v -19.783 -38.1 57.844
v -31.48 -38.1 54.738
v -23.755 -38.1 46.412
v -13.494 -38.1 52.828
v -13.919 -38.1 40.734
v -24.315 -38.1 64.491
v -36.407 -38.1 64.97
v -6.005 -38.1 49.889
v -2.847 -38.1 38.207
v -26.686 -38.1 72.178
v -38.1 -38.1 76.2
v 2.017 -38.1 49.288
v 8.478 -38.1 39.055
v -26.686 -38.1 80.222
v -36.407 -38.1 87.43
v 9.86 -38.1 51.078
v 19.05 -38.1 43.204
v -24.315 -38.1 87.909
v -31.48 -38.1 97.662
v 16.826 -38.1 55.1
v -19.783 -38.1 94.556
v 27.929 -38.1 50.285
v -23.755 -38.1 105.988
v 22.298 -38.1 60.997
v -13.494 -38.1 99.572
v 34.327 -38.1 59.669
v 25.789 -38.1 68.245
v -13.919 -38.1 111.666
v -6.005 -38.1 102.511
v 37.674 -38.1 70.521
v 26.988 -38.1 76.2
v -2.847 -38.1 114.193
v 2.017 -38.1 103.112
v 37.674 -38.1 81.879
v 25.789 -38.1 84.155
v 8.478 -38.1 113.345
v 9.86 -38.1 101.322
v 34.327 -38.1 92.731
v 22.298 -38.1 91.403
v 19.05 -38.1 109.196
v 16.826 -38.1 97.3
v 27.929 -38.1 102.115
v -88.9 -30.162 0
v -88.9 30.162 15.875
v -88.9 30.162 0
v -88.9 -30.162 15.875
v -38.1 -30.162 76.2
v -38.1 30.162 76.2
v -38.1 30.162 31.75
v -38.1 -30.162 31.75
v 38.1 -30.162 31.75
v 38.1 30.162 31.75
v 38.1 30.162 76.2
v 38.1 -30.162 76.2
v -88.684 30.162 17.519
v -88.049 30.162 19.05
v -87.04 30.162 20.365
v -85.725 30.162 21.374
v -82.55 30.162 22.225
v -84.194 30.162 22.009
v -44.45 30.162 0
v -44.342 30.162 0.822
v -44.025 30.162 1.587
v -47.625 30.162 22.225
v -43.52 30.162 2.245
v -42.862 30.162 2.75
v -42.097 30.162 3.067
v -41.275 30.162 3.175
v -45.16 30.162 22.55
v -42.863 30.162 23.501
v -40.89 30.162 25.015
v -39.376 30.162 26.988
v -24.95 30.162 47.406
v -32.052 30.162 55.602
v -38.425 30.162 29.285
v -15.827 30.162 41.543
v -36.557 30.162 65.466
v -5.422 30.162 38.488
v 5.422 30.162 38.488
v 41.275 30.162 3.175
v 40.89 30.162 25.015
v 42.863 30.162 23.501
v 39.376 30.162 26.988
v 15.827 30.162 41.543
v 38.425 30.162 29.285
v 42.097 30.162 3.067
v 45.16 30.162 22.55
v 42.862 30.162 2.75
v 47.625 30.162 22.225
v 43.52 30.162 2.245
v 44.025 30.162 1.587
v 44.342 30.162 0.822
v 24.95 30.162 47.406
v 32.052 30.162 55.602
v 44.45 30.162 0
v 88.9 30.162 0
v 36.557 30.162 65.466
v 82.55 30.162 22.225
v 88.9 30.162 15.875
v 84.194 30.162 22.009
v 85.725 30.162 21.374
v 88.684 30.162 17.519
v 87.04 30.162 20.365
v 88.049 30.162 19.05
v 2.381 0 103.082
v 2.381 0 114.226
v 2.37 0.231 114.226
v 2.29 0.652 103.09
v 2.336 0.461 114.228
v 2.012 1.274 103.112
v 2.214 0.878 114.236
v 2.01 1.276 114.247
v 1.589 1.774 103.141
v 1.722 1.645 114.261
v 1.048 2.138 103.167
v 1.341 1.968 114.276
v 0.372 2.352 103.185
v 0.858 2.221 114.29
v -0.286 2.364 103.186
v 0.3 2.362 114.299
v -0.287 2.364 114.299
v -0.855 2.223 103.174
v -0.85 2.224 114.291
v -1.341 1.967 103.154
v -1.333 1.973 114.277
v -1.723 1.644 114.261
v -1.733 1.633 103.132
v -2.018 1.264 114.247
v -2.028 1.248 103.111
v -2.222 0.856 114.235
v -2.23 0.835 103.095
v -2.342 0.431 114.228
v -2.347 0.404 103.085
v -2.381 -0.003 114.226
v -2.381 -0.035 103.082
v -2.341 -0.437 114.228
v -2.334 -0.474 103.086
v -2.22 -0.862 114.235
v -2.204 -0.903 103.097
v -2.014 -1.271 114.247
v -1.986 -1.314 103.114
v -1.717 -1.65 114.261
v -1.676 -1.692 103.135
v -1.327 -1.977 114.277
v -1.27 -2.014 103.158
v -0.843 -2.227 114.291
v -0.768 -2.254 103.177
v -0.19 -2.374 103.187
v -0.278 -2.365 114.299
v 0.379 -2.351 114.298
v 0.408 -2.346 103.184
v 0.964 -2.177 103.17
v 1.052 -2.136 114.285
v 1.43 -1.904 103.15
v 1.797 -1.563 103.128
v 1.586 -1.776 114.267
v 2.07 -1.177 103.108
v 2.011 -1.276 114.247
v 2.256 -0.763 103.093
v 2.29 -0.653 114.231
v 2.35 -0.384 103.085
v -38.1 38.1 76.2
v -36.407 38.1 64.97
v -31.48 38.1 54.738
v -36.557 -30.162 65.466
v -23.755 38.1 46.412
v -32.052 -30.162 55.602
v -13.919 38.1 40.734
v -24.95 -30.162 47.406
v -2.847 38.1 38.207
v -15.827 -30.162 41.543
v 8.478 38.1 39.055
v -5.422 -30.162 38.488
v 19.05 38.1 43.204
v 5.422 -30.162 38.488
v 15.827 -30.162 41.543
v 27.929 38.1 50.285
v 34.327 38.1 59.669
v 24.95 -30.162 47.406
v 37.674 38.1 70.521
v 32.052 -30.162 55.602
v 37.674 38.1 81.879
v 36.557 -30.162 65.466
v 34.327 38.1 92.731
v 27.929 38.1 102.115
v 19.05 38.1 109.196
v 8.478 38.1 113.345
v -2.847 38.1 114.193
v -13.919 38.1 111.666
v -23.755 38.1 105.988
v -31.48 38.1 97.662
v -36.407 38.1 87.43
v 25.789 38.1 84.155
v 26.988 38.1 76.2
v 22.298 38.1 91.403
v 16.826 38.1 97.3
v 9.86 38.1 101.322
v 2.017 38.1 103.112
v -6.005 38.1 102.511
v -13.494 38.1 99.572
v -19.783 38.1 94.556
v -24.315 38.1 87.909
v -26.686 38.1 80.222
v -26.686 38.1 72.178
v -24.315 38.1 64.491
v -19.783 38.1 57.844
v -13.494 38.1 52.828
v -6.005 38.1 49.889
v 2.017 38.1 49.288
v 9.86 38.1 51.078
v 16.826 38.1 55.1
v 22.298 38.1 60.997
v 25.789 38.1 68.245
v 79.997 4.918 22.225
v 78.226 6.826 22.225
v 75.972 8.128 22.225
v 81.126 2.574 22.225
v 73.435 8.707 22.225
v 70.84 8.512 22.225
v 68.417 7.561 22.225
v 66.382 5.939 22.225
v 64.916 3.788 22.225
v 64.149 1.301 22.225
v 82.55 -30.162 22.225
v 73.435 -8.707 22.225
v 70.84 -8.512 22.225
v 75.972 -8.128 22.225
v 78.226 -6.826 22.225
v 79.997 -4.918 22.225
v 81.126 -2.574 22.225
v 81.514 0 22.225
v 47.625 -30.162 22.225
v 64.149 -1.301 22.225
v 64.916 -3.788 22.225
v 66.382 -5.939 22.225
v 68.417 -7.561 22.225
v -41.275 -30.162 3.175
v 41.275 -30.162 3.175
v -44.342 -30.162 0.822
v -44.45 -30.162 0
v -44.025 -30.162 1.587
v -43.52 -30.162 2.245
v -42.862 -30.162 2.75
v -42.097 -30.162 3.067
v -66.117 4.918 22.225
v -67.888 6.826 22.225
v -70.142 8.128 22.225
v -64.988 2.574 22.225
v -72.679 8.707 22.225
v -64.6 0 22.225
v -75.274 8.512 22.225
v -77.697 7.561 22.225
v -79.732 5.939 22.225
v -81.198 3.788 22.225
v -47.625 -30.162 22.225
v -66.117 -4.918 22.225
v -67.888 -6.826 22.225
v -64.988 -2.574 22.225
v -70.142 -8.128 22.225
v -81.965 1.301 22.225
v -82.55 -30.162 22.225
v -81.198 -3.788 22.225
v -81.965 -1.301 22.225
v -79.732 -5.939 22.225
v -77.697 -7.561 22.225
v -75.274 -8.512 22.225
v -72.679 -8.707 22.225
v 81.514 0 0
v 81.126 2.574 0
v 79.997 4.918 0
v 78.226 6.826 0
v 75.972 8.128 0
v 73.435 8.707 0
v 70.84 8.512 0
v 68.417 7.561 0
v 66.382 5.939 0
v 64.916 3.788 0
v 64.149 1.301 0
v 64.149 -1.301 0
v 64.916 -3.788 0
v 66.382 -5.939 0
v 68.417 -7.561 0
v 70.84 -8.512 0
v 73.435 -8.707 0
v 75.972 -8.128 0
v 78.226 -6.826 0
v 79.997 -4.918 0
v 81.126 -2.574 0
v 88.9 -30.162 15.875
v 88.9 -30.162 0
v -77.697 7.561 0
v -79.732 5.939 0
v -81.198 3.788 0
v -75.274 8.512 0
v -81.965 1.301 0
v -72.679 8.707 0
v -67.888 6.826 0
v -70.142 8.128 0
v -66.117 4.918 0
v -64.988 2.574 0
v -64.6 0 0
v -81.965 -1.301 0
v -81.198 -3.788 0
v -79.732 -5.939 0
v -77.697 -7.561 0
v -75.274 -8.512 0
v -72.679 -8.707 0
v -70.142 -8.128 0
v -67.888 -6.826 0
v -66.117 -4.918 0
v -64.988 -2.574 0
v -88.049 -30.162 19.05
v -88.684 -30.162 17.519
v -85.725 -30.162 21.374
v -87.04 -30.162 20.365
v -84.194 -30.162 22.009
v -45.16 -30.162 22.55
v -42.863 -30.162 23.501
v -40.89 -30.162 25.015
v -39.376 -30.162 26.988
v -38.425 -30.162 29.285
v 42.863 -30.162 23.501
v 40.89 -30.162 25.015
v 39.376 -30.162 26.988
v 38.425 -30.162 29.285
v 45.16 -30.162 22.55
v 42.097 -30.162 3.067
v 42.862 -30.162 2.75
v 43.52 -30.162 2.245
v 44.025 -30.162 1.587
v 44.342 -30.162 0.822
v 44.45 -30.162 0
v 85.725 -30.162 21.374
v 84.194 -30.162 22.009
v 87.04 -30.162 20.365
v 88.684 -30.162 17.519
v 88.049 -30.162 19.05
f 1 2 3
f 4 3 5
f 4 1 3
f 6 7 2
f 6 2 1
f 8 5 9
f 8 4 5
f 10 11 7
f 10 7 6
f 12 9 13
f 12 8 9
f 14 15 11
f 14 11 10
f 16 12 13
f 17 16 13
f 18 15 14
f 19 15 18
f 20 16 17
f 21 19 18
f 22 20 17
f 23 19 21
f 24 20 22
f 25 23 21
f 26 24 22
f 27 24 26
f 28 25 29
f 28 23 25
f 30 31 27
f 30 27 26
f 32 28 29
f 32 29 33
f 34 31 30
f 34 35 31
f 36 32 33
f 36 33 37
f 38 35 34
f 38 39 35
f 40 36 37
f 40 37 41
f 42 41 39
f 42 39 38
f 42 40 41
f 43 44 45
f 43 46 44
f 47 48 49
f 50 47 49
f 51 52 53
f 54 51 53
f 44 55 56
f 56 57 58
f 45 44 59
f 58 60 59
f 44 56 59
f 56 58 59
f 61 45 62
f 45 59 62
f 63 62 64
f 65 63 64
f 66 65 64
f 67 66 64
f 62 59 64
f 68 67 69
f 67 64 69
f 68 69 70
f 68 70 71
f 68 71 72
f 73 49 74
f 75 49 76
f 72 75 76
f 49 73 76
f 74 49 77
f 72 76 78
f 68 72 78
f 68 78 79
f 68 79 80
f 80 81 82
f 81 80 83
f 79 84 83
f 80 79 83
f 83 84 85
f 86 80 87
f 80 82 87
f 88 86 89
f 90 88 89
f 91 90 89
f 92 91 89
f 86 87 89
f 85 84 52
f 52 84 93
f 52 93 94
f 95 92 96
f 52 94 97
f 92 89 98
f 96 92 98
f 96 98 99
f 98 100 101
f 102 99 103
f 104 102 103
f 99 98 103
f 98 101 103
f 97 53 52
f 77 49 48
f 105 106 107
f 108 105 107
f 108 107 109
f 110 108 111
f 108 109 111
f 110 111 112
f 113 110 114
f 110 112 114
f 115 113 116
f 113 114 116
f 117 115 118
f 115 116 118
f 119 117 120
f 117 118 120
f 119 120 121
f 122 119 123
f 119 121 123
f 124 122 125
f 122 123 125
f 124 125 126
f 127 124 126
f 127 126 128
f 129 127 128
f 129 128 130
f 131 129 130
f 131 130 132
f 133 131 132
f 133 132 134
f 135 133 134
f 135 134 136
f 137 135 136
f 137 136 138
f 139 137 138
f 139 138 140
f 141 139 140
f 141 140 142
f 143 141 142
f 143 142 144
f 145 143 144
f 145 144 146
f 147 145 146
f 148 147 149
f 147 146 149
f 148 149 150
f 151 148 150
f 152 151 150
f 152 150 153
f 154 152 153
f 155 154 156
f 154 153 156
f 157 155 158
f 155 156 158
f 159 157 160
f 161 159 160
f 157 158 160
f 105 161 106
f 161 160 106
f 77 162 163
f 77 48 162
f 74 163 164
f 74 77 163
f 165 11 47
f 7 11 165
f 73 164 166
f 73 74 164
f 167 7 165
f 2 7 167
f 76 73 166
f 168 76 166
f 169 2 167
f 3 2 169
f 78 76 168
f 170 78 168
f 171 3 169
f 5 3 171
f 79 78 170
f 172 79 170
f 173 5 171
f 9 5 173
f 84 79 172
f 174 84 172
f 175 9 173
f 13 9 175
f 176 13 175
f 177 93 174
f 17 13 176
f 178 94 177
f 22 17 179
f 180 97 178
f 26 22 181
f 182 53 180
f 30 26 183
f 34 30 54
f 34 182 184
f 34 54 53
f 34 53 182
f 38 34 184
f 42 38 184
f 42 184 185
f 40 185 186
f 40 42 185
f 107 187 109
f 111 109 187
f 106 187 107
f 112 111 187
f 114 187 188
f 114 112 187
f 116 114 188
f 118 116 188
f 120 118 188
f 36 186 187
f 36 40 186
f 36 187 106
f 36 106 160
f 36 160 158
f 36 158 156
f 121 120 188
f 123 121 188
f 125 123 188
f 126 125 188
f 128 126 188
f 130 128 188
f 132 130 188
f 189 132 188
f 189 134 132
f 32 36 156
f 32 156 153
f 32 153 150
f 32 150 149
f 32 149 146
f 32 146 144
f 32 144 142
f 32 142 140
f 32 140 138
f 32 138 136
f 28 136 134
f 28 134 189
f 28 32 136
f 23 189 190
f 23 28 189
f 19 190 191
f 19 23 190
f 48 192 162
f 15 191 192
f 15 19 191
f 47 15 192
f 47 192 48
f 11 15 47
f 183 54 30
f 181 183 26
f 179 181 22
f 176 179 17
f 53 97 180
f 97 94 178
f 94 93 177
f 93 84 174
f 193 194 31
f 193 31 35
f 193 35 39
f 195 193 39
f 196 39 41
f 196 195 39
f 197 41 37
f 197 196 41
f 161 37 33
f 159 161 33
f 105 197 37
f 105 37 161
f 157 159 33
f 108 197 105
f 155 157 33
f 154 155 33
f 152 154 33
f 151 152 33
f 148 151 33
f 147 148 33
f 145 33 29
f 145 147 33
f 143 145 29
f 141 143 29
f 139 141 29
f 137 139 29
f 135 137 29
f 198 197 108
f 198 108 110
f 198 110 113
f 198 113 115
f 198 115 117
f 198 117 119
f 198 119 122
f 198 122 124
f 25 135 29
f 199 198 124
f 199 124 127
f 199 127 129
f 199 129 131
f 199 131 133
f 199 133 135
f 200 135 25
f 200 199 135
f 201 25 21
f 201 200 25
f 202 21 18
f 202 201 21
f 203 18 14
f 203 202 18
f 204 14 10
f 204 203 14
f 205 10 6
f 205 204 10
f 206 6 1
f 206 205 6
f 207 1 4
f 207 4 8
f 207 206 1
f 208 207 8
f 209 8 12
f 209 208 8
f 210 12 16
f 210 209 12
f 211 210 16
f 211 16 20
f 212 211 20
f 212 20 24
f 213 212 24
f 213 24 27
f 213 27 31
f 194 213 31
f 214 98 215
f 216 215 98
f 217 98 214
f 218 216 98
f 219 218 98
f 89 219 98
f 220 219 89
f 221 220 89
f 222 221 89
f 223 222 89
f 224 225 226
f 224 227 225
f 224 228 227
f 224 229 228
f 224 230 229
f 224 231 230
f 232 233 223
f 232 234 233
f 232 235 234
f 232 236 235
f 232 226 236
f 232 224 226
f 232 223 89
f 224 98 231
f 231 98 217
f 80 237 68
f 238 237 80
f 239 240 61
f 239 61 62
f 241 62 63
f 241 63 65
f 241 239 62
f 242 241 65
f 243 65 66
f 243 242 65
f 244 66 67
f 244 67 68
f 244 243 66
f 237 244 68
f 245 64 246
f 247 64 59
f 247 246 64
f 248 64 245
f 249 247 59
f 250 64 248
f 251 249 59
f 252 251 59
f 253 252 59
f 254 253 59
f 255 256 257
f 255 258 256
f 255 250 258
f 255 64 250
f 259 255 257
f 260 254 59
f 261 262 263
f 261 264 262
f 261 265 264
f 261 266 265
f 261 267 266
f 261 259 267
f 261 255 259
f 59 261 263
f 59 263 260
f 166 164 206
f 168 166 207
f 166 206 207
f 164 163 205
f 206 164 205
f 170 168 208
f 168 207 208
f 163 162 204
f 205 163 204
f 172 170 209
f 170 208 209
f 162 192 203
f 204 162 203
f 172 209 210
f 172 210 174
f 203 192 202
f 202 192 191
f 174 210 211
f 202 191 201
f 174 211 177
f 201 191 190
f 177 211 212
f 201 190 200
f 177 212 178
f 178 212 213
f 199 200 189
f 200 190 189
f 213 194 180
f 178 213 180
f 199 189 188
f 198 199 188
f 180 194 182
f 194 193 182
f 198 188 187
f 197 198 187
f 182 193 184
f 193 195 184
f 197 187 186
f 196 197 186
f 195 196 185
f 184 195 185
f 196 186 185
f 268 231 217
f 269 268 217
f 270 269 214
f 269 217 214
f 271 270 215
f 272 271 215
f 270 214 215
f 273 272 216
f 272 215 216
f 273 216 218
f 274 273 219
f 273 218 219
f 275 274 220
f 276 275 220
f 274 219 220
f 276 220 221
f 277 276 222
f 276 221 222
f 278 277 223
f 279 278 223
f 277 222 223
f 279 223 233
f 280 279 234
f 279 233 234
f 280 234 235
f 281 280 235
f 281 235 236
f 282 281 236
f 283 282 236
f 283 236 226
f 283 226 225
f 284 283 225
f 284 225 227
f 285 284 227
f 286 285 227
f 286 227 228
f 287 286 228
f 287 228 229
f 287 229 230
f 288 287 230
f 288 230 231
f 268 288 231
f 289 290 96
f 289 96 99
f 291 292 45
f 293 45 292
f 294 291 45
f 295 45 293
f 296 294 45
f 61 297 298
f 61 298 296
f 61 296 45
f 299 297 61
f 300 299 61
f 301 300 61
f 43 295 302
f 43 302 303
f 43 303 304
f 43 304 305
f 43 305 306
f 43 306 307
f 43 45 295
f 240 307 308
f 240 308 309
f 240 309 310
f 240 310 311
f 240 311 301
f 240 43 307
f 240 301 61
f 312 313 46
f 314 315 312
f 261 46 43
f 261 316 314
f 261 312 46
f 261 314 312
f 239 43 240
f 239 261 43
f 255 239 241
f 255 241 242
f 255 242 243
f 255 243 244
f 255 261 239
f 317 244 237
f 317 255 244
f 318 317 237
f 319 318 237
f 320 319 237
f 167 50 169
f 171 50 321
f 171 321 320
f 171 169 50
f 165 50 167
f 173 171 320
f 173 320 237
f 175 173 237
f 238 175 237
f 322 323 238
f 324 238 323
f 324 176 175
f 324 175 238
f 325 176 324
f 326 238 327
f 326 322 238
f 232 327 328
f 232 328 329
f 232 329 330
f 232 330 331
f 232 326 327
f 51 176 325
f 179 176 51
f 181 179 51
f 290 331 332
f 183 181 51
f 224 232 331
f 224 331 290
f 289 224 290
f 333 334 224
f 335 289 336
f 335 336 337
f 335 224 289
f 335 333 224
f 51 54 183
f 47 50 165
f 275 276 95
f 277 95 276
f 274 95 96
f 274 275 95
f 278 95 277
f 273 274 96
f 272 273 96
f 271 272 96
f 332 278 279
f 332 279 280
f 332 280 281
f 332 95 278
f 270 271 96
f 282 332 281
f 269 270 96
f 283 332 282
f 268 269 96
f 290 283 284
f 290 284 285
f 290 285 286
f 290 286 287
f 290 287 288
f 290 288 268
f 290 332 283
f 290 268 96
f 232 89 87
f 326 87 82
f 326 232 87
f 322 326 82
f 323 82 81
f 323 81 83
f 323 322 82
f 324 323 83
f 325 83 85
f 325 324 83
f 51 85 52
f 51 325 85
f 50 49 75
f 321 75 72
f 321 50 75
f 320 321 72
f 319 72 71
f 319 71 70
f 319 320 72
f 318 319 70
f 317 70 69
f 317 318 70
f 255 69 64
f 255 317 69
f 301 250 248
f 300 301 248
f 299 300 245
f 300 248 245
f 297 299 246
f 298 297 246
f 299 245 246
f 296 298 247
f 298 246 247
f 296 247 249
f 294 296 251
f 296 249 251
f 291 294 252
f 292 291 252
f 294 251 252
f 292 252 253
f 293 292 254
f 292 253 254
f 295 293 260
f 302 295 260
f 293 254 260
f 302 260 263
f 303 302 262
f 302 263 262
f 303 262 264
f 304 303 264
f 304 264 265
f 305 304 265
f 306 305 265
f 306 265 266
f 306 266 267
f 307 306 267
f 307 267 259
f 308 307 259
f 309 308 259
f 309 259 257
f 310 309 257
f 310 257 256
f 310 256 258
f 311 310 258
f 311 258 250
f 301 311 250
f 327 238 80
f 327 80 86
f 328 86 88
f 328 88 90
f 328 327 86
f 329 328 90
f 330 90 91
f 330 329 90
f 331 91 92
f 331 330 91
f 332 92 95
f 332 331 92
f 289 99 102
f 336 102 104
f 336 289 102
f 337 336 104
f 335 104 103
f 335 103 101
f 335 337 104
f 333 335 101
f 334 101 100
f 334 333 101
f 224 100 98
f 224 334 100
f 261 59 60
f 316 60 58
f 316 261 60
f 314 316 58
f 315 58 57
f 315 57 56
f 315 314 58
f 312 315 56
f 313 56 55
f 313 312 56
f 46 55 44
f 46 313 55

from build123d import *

# Parameters (mm, degrees)
F1_DEPTH = 30.1625
F0_R     = 26.9875
F2_DEPTH = 38.1
F3_R     = 8.73125
F4_DEPTH = 25.4
F5_R     = 8.73125
F6_DEPTH = 25.4
F8_R     = 2.38125
F9_DEPTH = 25.4


with BuildPart() as f1:
    # F0 (on Front) → F1 (new body, symmetric)
    with BuildSketch(Plane.XZ):
        with BuildLine():
            Line((-88.9, 15.875), (-88.9, 0))
            Line((-88.9, 0), (-44.45, 0))
            ThreePointArc((-44.45, 0), (-43.520064, 2.245064), (-41.275, 3.175))
            Line((-41.275, 3.175), (41.275, 3.175))
            ThreePointArc((41.275, 3.175), (43.520064, 2.245064), (44.45, 0))
            Line((44.45, 0), (88.9, 0))
            Line((88.9, 0), (88.9, 15.875))
            ThreePointArc((88.9, 15.875), (87.040128, 20.365128), (82.55, 22.225))
            Line((82.55, 22.225), (47.625, 22.225))
            ThreePointArc((47.625, 22.225), (40.889808, 25.014808), (38.1, 31.75))
            Line((38.1, 31.75), (38.1, 76.2))
            ThreePointArc((38.1, 76.2), (0, 38.1), (-38.1, 76.2))
            Line((-38.1, 76.2), (-38.1, 31.75))
            ThreePointArc((-38.1, 31.75), (-40.889808, 25.014808), (-47.625, 22.225))
            Line((-47.625, 22.225), (-82.55, 22.225))
            ThreePointArc((-82.55, 22.225), (-87.040128, 20.365128), (-88.9, 15.875))
        make_face()
    extrude(amount=F1_DEPTH, both=True)

    # F0 (on Front) → F2 (join, symmetric)
    with BuildSketch(Plane.XZ):
        with BuildLine():
            ThreePointArc((38.1, 76.2), (0, 114.3), (-38.1, 76.2))
            ThreePointArc((-38.1, 76.2), (0, 38.1), (38.1, 76.2))
        make_face()
        with Locations((0, 76.2)):
            Circle(F0_R, mode=Mode.SUBTRACT)
    extrude(amount=F2_DEPTH, both=True)

    # F3 (on face) → F4 (cut)
    with BuildSketch(Plane.XY.offset(22.225)):
        with Locations((72.782576, 0)):
            Circle(F3_R)
    extrude(amount=-F4_DEPTH, mode=Mode.SUBTRACT)

    # F5 (on face) → F6 (cut)
    with BuildSketch(Plane.XY.offset(22.225)):
        with Locations((-73.331527, 0)):
            Circle(F5_R)
    extrude(amount=-F6_DEPTH, mode=Mode.SUBTRACT)

    # F8 (on offset) → F9 (cut)
    with BuildSketch(Plane.XY.offset(114.3)):
        Circle(F8_R)
    extrude(amount=-F9_DEPTH, mode=Mode.SUBTRACT)


solid = f1.part
